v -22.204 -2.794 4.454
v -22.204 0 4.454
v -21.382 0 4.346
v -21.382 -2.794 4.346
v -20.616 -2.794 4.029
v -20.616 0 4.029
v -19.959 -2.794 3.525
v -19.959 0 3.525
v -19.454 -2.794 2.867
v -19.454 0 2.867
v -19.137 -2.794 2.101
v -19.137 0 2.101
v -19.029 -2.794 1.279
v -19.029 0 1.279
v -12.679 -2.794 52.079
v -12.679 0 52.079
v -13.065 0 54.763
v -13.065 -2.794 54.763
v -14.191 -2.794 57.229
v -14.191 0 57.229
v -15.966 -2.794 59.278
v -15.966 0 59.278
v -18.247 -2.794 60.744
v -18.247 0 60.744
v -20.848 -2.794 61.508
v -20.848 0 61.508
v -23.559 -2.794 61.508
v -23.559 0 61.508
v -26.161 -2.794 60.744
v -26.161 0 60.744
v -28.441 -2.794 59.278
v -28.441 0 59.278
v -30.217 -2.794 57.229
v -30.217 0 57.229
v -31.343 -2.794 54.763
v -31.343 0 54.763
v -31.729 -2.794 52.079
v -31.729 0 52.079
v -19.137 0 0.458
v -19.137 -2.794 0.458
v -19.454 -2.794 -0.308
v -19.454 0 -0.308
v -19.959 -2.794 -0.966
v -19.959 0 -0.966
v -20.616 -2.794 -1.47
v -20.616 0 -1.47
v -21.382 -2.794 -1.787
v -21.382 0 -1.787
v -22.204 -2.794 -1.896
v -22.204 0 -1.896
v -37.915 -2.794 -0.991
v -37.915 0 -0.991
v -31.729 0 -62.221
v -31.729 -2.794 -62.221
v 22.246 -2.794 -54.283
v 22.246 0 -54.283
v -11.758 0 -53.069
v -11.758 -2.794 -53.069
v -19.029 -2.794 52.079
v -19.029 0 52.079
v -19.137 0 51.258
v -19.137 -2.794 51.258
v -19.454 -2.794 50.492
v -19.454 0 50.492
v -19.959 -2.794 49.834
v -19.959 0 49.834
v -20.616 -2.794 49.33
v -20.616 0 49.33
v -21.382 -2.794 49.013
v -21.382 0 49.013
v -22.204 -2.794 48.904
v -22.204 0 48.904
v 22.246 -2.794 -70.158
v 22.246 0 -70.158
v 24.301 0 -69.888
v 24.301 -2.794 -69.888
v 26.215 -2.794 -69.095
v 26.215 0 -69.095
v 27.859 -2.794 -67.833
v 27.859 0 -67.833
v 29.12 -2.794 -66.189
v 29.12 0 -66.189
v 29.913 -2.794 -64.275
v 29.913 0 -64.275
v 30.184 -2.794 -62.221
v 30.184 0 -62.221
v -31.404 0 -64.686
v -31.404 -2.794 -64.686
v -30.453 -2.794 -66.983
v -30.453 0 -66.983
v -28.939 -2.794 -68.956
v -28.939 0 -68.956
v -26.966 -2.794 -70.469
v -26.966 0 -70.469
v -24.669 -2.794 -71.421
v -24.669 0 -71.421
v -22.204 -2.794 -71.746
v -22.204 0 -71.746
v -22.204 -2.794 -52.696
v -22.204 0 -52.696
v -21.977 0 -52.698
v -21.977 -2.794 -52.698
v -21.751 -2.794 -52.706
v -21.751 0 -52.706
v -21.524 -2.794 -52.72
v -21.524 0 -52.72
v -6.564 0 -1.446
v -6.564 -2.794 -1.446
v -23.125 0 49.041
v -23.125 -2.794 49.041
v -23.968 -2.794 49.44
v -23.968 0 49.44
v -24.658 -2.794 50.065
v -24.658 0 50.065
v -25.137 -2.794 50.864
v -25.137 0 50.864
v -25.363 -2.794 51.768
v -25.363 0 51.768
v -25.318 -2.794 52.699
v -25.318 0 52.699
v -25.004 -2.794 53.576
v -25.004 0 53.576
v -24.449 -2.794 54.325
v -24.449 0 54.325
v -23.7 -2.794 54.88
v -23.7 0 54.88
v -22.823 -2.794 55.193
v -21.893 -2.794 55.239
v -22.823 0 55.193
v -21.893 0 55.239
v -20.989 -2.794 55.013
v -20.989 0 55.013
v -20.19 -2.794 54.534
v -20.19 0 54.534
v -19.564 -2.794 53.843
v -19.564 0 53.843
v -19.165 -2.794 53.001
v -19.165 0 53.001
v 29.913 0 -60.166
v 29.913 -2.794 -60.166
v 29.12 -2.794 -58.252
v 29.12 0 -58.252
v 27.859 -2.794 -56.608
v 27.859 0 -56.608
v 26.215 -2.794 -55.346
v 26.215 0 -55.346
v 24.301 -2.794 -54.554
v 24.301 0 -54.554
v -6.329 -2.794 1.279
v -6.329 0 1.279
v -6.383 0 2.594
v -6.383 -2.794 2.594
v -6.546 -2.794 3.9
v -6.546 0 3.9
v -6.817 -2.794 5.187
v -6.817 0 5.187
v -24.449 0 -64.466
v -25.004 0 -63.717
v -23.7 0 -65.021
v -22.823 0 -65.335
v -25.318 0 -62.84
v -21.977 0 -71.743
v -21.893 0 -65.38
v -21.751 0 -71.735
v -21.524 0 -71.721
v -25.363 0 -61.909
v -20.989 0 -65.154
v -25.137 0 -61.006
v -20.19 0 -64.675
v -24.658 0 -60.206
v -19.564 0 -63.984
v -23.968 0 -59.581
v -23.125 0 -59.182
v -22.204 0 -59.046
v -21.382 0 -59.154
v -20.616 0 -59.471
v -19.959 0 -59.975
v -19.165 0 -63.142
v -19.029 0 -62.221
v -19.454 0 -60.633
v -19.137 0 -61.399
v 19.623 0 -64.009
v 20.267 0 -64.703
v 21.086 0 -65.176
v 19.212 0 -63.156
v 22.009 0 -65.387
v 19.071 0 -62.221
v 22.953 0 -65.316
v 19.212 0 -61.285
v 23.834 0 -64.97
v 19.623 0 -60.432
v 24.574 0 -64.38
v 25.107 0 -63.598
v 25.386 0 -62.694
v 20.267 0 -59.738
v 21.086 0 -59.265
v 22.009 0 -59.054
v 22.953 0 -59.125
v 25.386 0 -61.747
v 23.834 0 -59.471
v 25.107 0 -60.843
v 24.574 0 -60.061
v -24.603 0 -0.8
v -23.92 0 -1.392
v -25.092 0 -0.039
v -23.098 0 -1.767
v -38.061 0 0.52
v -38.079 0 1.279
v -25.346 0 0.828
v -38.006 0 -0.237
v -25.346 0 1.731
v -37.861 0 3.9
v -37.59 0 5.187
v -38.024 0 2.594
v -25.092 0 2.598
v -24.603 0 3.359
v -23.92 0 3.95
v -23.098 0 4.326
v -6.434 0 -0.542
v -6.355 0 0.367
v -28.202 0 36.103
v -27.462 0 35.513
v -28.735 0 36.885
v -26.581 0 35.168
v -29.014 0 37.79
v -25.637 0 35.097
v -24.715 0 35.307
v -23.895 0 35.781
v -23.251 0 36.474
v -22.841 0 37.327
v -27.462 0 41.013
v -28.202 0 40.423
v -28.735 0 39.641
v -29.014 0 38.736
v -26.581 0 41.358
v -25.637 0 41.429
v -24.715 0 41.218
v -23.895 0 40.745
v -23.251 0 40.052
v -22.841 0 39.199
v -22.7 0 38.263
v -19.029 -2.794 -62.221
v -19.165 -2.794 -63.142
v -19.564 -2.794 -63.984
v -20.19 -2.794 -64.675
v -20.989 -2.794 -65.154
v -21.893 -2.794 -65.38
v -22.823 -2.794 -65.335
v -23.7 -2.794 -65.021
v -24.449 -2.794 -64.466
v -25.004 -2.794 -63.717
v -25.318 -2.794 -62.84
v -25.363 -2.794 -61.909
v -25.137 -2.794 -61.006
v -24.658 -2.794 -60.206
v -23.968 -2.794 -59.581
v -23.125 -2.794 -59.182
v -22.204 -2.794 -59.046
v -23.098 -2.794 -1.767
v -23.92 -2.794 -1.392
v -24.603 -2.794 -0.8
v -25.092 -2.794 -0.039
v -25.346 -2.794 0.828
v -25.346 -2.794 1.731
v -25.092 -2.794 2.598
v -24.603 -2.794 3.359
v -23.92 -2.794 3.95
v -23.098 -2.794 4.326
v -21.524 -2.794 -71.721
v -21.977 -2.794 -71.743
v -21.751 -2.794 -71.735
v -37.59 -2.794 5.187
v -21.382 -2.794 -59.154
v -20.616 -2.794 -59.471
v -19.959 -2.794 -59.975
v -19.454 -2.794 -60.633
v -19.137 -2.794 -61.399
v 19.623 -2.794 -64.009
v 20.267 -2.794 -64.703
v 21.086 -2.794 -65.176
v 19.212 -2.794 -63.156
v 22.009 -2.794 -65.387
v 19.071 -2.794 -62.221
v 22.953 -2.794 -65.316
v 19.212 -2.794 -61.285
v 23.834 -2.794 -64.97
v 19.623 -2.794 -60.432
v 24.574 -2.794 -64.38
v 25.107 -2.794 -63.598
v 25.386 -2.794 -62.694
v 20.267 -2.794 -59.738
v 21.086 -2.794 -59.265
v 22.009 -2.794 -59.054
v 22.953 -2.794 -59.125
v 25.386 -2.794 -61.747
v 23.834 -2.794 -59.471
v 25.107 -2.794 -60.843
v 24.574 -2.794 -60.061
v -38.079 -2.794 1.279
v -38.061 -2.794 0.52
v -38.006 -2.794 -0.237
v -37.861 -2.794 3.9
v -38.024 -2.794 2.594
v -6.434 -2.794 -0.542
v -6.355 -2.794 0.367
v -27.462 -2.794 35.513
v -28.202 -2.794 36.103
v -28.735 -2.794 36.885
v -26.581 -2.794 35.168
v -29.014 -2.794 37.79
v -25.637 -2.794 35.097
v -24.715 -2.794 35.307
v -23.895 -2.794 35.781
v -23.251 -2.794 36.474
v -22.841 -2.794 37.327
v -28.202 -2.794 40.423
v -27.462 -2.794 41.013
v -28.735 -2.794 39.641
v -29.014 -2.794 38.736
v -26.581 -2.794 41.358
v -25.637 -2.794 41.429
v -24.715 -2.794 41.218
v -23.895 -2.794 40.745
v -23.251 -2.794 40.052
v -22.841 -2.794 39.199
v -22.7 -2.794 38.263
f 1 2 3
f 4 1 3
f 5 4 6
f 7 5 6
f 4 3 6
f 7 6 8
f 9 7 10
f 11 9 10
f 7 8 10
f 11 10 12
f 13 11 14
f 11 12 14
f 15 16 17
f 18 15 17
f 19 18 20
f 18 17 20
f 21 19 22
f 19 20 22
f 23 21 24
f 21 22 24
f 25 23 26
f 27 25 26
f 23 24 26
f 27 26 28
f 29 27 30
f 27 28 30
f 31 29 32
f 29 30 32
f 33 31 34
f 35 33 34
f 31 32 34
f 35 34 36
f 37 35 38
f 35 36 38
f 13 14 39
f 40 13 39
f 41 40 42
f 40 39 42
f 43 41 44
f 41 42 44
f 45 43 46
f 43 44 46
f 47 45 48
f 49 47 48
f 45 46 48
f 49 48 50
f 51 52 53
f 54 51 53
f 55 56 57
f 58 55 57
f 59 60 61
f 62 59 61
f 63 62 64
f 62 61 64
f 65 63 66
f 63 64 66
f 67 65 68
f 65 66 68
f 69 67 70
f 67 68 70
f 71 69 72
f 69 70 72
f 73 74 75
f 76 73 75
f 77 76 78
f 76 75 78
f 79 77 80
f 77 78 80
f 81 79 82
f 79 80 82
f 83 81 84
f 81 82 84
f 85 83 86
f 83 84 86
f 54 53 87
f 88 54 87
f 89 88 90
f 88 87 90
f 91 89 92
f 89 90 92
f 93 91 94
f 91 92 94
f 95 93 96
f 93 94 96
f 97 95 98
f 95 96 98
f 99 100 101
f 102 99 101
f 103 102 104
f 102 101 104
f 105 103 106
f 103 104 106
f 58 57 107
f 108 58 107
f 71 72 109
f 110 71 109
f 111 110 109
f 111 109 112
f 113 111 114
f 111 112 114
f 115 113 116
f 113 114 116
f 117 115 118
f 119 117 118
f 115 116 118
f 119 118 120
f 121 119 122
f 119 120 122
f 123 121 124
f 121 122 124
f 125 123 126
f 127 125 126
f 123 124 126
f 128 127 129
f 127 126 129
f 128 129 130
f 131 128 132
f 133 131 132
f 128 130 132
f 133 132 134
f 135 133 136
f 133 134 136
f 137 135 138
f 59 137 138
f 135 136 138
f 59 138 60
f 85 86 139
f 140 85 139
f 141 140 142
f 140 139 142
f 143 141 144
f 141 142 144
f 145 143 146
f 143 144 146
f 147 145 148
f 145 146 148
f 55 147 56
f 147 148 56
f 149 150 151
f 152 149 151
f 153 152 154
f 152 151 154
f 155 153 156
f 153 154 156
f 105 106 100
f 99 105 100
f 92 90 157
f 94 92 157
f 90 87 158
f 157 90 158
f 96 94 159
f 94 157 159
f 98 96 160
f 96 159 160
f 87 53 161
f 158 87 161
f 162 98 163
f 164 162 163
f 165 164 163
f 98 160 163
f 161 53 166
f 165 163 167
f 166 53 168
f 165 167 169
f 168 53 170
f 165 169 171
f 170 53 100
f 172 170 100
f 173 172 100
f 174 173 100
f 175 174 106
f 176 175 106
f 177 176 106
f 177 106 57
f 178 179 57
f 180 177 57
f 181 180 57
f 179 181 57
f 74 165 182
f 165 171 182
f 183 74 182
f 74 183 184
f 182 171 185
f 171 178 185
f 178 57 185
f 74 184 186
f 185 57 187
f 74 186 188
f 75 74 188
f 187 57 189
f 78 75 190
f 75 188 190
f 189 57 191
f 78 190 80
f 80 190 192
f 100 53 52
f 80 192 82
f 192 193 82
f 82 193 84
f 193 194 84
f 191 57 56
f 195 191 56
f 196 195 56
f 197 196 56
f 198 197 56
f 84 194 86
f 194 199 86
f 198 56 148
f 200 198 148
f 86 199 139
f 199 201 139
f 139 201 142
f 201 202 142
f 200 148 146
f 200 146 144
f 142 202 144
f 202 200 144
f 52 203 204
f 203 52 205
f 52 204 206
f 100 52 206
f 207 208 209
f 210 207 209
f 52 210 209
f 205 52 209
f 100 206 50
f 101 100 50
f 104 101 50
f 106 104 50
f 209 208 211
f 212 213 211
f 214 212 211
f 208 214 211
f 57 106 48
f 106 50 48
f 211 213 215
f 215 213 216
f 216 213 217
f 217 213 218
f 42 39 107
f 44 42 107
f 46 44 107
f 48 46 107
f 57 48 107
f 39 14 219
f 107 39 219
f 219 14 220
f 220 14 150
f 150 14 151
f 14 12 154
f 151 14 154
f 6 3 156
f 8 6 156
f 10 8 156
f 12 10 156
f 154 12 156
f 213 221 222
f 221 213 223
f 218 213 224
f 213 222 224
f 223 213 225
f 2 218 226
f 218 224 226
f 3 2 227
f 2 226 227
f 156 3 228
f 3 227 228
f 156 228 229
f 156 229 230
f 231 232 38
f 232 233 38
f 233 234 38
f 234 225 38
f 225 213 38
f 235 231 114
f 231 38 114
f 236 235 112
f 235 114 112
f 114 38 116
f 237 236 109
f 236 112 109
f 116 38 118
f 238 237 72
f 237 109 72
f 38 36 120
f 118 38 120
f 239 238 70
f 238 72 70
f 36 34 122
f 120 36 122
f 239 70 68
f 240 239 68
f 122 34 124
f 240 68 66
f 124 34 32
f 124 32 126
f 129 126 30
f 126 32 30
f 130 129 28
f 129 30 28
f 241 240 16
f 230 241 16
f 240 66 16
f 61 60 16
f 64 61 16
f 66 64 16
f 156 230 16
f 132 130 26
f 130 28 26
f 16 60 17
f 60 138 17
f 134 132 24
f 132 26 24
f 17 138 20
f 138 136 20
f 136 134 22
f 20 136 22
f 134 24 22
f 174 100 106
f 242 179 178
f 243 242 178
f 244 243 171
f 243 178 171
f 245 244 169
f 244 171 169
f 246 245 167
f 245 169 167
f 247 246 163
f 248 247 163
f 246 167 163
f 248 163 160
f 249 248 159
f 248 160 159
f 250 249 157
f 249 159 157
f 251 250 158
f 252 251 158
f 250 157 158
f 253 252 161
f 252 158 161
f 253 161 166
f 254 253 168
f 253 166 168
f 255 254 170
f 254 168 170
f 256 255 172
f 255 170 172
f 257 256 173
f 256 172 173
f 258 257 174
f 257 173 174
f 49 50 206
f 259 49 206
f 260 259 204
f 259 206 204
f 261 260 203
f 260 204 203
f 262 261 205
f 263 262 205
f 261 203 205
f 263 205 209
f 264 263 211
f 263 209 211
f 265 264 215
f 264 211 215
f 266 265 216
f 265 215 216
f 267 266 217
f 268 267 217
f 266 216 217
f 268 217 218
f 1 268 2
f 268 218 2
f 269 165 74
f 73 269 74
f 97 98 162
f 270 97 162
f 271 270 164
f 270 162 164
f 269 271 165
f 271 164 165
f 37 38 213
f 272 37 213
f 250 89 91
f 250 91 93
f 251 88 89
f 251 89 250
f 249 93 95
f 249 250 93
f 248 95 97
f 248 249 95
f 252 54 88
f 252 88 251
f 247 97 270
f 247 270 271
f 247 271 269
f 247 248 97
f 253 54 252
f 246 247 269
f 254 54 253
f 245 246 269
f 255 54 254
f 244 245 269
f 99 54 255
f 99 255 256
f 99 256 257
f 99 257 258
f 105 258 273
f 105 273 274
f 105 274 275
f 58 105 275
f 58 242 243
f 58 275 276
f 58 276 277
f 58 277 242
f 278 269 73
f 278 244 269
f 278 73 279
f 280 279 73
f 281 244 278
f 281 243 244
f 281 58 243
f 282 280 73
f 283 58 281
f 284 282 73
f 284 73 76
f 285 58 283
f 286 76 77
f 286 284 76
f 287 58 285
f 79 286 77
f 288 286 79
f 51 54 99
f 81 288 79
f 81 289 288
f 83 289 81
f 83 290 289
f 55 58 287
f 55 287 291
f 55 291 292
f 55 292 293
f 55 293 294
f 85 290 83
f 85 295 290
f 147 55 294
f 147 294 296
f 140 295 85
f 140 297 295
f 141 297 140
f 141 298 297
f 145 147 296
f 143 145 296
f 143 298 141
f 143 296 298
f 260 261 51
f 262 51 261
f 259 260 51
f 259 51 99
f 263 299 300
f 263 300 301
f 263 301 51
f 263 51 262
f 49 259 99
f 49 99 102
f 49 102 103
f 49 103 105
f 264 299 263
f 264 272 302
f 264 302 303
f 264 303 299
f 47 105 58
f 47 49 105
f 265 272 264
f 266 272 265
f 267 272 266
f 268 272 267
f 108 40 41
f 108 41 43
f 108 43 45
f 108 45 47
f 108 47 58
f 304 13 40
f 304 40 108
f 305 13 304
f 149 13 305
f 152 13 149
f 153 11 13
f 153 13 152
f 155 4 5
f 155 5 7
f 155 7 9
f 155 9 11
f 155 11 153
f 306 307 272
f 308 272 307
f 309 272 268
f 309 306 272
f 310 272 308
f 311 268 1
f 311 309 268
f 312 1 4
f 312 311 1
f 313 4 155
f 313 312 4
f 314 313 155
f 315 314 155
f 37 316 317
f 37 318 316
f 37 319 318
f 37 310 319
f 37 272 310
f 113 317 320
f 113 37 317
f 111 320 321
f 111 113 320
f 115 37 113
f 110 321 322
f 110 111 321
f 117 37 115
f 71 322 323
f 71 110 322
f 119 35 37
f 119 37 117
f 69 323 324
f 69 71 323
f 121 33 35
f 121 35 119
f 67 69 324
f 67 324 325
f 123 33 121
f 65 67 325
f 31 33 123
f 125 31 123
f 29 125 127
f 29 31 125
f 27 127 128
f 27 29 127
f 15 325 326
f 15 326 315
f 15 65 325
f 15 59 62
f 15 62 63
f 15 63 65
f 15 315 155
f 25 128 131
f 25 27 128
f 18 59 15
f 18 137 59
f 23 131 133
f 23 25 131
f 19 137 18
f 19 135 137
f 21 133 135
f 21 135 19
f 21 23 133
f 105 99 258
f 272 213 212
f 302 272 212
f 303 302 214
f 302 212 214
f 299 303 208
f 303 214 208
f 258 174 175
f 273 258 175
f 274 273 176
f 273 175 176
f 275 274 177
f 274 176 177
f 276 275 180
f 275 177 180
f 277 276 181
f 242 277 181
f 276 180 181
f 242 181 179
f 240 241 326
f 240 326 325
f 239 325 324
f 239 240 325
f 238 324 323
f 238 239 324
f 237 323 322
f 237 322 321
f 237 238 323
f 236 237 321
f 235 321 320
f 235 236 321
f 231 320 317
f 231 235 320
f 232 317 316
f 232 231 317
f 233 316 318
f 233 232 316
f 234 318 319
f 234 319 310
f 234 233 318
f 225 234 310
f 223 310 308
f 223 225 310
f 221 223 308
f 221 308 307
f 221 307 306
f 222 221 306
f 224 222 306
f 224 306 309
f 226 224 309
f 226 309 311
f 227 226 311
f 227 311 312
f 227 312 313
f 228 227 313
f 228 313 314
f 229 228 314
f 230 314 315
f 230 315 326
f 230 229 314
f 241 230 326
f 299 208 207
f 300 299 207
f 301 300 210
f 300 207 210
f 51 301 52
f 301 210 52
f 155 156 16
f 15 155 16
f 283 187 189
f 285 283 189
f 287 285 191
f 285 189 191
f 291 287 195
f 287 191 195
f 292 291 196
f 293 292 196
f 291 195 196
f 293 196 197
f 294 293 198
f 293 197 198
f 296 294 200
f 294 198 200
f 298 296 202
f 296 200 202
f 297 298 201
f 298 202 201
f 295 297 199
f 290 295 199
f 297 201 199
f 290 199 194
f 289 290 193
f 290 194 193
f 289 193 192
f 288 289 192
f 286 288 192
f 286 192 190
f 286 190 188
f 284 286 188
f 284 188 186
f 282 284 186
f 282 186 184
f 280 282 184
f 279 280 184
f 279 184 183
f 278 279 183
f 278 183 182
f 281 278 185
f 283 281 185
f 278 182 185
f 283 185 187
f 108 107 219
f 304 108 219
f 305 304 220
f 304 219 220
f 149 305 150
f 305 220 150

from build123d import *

# Parameters (mm, degrees)
F0_R     = 3.175
F1_DEPTH = 2.794


with BuildPart() as f1:
    # F0 (on Front) → F1 (new body)
    with BuildSketch(Plane.XZ):
        with BuildLine():
            Line((-37.5902472441, 5.1871481091), (-38.0787087825, 1.2794558015))
            ThreePointArc((-38.0787087825, 1.2794558015), (-38.0378492862, 0.1412029688), (-37.9154811276, -0.9911905332))
            ThreePointArc((-37.9154811276, -0.9911905332), (-32.5952706102, -10.7218386196), (-22.2037087825, -14.5955441985))
            Line((-22.2037087825, -14.5955441985), (-22.2037087825, -1.8955441985))
            ThreePointArc((-22.2037087825, -1.8955441985), (-25.3787087825, 1.2794558015), (-22.2037087825, 4.4544558015))
            Line((-22.2037087825, 4.4544558015), (-22.2037087825, 17.1544558015))
            ThreePointArc((-22.2037087825, 17.1544558015), (-31.9500160221, 13.8104222523), (-37.5902472441, 5.1871481091))
        make_face()
        with BuildLine():
            ThreePointArc((-37.5902472441, 5.1871481091), (-37.9561200754, 3.2485072131), (-38.0787087825, 1.2794558015))
            Line((-38.0787087825, 1.2794558015), (-37.5902472441, 5.1871481091))
        make_face()
        with BuildLine():
            ThreePointArc((-22.2037087825, -14.5955441985), (-32.5952706102, -10.7218386196), (-37.9154811276, -0.9911905332))
            Line((-37.9154811276, -0.9911905332), (-31.7287087825, -62.2205441985))
            ThreePointArc((-31.7287087825, -62.2205441985), (-28.9389008733, -55.4853521077), (-22.2037087825, -52.6955441985))
            Line((-22.2037087825, -52.6955441985), (-22.2037087825, -14.5955441985))
        make_face()
        with BuildLine():
            Line((-31.7287087825, 52.0794558015), (-37.5902472441, 5.1871481091))
            ThreePointArc((-37.5902472441, 5.1871481091), (-31.9500160221, 13.8104222523), (-22.2037087825, 17.1544558015))
            Line((-22.2037087825, 17.1544558015), (-22.2037087825, 38.2629670203))
            Line((-22.2037087825, 38.2629670203), (-22.2037087825, 42.5544558015))
            ThreePointArc((-22.2037087825, 42.5544558015), (-28.9389008733, 45.3442637107), (-31.7287087825, 52.0794558015))
        make_face()
        with Locations((-25.8746817708, 38.2629670203)):
            Circle(F0_R, mode=Mode.SUBTRACT)
        with BuildLine():
            Line((-22.2037087825, -1.8955441985), (-22.2037087825, -14.5955441985))
            ThreePointArc((-22.2037087825, -14.5955441985), (-11.9871413621, -10.871156329), (-6.5643326528, -1.4455284687))
            ThreePointArc((-6.5643326528, -1.4455284687), (-6.3877244461, -0.0881203281), (-6.3287087825, 1.2794558015))
            Line((-6.3287087825, 1.2794558015), (-6.817170321, 5.1871481091))
            ThreePointArc((-6.817170321, 5.1871481091), (-12.457401543, 13.8104222523), (-22.2037087825, 17.1544558015))
            Line((-22.2037087825, 17.1544558015), (-22.2037087825, 4.4544558015))
            ThreePointArc((-22.2037087825, 4.4544558015), (-19.9586447523, 3.5245198317), (-19.0287087825, 1.2794558015))
            ThreePointArc((-19.0287087825, 1.2794558015), (-19.9586447523, -0.9656082288), (-22.2037087825, -1.8955441985))
        make_face()
        with BuildLine():
            ThreePointArc((-6.5643326528, -1.4455284687), (-11.9871413621, -10.871156329), (-22.2037087825, -14.5955441985))
            Line((-22.2037087825, -14.5955441985), (-22.2037087825, -52.6955441985))
            ThreePointArc((-22.2037087825, -52.6955441985), (-21.8637469544, -52.7016130109), (-21.5242183367, -52.7198117145))
            Line((-21.5242183367, -52.7198117145), (-11.7579621852, -53.068606577))
            Line((-11.7579621852, -53.068606577), (-6.5643326528, -1.4455284687))
        make_face()
        with BuildLine():
            ThreePointArc((-22.2037087825, -52.6955441985), (-28.9389008733, -55.4853521077), (-31.7287087825, -62.2205441985))
            ThreePointArc((-31.7287087825, -62.2205441985), (-28.9389008733, -68.9557362893), (-22.2037087825, -71.7455441985))
            Line((-22.2037087825, -71.7455441985), (-21.5242183367, -71.7212766826))
            ThreePointArc((-21.5242183367, -71.7212766826), (-15.2324186761, -68.711055677), (-12.6787087825, -62.2205441985))
            Line((-12.6787087825, -62.2205441985), (-19.0287087825, -62.2205441985))
            ThreePointArc((-19.0287087825, -62.2205441985), (-24.4487728128, -64.4656082288), (-22.2037087825, -59.0455441985))
            Line((-22.2037087825, -59.0455441985), (-22.2037087825, -52.6955441985))
        make_face()
        with BuildLine():
            Line((-22.2037087825, 38.2629670203), (-22.2037087825, 17.1544558015))
            ThreePointArc((-22.2037087825, 17.1544558015), (-12.457401543, 13.8104222523), (-6.817170321, 5.1871481091))
            Line((-6.817170321, 5.1871481091), (-12.6787087825, 52.0794558015))
            ThreePointArc((-12.6787087825, 52.0794558015), (-15.4685166917, 45.3442637107), (-22.2037087825, 42.5544558015))
            Line((-22.2037087825, 42.5544558015), (-22.2037087825, 38.2629670203))
        make_face()
        with BuildLine():
            ThreePointArc((-12.6787087825, 52.0794558015), (-22.2037087825, 61.6044558015), (-31.7287087825, 52.0794558015))
            ThreePointArc((-31.7287087825, 52.0794558015), (-28.9389008733, 45.3442637107), (-22.2037087825, 42.5544558015))
            ThreePointArc((-22.2037087825, 42.5544558015), (-15.4685166917, 45.3442637107), (-12.6787087825, 52.0794558015))
        make_face()
        with BuildLine():
            ThreePointArc((-19.0287087825, 52.0794558015), (-19.9586447523, 49.8343917712), (-22.2037087825, 48.9044558015))
            ThreePointArc((-22.2037087825, 48.9044558015), (-24.4487728128, 54.3245198317), (-19.0287087825, 52.0794558015))
        make_face(mode=Mode.SUBTRACT)
        with BuildLine():
            Line((-21.5242183367, -71.7212766826), (-22.2037087825, -71.7455441985))
            ThreePointArc((-22.2037087825, -71.7455441985), (-21.8637469544, -71.7394753862), (-21.5242183367, -71.7212766826))
        make_face()
        with BuildLine():
            ThreePointArc((-6.3287087825, 1.2794558015), (-6.4512974897, 3.2485072131), (-6.817170321, 5.1871481091))
            Line((-6.817170321, 5.1871481091), (-6.3287087825, 1.2794558015))
        make_face()
        with BuildLine():
            Line((22.2462912175, -54.2830441985), (-11.7579621852, -53.068606577))
            Line((-11.7579621852, -53.068606577), (-12.6787087825, -62.2205441985))
            Line((-12.6787087825, -62.2205441985), (14.3087912175, -62.2205441985))
            ThreePointArc((14.3087912175, -62.2205441985), (16.6336311418, -56.6078841229), (22.2462912175, -54.2830441985))
        make_face()
        with BuildLine():
            Line((-12.6787087825, -62.2205441985), (-11.7579621852, -53.068606577))
            Line((-11.7579621852, -53.068606577), (-21.5242183367, -52.7198117145))
            ThreePointArc((-21.5242183367, -52.7198117145), (-15.2324186761, -55.7300327201), (-12.6787087825, -62.2205441985))
        make_face()
        with BuildLine():
            ThreePointArc((-12.6787087825, -62.2205441985), (-15.2324186761, -68.711055677), (-21.5242183367, -71.7212766826))
            Line((-21.5242183367, -71.7212766826), (22.2462912175, -70.1580441985))
            ThreePointArc((22.2462912175, -70.1580441985), (16.6336311418, -67.8332042742), (14.3087912175, -62.2205441985))
            Line((14.3087912175, -62.2205441985), (-12.6787087825, -62.2205441985))
        make_face()
        with BuildLine():
            ThreePointArc((30.1837912175, -62.2205441985), (27.8589512931, -56.6078841229), (22.2462912175, -54.2830441985))
            ThreePointArc((22.2462912175, -54.2830441985), (16.6336311418, -56.6078841229), (14.3087912175, -62.2205441985))
            ThreePointArc((14.3087912175, -62.2205441985), (16.6336311418, -67.8332042742), (22.2462912175, -70.1580441985))
            ThreePointArc((22.2462912175, -70.1580441985), (27.8589512931, -67.8332042742), (30.1837912175, -62.2205441985))
        make_face()
        with BuildLine():
            ThreePointArc((25.4212912175, -62.2205441985), (22.2462912175, -65.3955441985), (19.0712912175, -62.2205441985))
            ThreePointArc((19.0712912175, -62.2205441985), (22.2462912175, -59.0455441985), (25.4212912175, -62.2205441985))
        make_face(mode=Mode.SUBTRACT)
        with BuildLine():
            Line((-21.5242183367, -52.7198117145), (-22.2037087825, -52.6955441985))
            Line((-22.2037087825, -52.6955441985), (-22.2037087825, -59.0455441985))
            ThreePointArc((-22.2037087825, -59.0455441985), (-19.9586447523, -59.9754801683), (-19.0287087825, -62.2205441985))
            Line((-19.0287087825, -62.2205441985), (-12.6787087825, -62.2205441985))
            ThreePointArc((-12.6787087825, -62.2205441985), (-15.2324186761, -55.7300327201), (-21.5242183367, -52.7198117145))
        make_face()
    extrude(amount=F1_DEPTH)


solid = f1.part
